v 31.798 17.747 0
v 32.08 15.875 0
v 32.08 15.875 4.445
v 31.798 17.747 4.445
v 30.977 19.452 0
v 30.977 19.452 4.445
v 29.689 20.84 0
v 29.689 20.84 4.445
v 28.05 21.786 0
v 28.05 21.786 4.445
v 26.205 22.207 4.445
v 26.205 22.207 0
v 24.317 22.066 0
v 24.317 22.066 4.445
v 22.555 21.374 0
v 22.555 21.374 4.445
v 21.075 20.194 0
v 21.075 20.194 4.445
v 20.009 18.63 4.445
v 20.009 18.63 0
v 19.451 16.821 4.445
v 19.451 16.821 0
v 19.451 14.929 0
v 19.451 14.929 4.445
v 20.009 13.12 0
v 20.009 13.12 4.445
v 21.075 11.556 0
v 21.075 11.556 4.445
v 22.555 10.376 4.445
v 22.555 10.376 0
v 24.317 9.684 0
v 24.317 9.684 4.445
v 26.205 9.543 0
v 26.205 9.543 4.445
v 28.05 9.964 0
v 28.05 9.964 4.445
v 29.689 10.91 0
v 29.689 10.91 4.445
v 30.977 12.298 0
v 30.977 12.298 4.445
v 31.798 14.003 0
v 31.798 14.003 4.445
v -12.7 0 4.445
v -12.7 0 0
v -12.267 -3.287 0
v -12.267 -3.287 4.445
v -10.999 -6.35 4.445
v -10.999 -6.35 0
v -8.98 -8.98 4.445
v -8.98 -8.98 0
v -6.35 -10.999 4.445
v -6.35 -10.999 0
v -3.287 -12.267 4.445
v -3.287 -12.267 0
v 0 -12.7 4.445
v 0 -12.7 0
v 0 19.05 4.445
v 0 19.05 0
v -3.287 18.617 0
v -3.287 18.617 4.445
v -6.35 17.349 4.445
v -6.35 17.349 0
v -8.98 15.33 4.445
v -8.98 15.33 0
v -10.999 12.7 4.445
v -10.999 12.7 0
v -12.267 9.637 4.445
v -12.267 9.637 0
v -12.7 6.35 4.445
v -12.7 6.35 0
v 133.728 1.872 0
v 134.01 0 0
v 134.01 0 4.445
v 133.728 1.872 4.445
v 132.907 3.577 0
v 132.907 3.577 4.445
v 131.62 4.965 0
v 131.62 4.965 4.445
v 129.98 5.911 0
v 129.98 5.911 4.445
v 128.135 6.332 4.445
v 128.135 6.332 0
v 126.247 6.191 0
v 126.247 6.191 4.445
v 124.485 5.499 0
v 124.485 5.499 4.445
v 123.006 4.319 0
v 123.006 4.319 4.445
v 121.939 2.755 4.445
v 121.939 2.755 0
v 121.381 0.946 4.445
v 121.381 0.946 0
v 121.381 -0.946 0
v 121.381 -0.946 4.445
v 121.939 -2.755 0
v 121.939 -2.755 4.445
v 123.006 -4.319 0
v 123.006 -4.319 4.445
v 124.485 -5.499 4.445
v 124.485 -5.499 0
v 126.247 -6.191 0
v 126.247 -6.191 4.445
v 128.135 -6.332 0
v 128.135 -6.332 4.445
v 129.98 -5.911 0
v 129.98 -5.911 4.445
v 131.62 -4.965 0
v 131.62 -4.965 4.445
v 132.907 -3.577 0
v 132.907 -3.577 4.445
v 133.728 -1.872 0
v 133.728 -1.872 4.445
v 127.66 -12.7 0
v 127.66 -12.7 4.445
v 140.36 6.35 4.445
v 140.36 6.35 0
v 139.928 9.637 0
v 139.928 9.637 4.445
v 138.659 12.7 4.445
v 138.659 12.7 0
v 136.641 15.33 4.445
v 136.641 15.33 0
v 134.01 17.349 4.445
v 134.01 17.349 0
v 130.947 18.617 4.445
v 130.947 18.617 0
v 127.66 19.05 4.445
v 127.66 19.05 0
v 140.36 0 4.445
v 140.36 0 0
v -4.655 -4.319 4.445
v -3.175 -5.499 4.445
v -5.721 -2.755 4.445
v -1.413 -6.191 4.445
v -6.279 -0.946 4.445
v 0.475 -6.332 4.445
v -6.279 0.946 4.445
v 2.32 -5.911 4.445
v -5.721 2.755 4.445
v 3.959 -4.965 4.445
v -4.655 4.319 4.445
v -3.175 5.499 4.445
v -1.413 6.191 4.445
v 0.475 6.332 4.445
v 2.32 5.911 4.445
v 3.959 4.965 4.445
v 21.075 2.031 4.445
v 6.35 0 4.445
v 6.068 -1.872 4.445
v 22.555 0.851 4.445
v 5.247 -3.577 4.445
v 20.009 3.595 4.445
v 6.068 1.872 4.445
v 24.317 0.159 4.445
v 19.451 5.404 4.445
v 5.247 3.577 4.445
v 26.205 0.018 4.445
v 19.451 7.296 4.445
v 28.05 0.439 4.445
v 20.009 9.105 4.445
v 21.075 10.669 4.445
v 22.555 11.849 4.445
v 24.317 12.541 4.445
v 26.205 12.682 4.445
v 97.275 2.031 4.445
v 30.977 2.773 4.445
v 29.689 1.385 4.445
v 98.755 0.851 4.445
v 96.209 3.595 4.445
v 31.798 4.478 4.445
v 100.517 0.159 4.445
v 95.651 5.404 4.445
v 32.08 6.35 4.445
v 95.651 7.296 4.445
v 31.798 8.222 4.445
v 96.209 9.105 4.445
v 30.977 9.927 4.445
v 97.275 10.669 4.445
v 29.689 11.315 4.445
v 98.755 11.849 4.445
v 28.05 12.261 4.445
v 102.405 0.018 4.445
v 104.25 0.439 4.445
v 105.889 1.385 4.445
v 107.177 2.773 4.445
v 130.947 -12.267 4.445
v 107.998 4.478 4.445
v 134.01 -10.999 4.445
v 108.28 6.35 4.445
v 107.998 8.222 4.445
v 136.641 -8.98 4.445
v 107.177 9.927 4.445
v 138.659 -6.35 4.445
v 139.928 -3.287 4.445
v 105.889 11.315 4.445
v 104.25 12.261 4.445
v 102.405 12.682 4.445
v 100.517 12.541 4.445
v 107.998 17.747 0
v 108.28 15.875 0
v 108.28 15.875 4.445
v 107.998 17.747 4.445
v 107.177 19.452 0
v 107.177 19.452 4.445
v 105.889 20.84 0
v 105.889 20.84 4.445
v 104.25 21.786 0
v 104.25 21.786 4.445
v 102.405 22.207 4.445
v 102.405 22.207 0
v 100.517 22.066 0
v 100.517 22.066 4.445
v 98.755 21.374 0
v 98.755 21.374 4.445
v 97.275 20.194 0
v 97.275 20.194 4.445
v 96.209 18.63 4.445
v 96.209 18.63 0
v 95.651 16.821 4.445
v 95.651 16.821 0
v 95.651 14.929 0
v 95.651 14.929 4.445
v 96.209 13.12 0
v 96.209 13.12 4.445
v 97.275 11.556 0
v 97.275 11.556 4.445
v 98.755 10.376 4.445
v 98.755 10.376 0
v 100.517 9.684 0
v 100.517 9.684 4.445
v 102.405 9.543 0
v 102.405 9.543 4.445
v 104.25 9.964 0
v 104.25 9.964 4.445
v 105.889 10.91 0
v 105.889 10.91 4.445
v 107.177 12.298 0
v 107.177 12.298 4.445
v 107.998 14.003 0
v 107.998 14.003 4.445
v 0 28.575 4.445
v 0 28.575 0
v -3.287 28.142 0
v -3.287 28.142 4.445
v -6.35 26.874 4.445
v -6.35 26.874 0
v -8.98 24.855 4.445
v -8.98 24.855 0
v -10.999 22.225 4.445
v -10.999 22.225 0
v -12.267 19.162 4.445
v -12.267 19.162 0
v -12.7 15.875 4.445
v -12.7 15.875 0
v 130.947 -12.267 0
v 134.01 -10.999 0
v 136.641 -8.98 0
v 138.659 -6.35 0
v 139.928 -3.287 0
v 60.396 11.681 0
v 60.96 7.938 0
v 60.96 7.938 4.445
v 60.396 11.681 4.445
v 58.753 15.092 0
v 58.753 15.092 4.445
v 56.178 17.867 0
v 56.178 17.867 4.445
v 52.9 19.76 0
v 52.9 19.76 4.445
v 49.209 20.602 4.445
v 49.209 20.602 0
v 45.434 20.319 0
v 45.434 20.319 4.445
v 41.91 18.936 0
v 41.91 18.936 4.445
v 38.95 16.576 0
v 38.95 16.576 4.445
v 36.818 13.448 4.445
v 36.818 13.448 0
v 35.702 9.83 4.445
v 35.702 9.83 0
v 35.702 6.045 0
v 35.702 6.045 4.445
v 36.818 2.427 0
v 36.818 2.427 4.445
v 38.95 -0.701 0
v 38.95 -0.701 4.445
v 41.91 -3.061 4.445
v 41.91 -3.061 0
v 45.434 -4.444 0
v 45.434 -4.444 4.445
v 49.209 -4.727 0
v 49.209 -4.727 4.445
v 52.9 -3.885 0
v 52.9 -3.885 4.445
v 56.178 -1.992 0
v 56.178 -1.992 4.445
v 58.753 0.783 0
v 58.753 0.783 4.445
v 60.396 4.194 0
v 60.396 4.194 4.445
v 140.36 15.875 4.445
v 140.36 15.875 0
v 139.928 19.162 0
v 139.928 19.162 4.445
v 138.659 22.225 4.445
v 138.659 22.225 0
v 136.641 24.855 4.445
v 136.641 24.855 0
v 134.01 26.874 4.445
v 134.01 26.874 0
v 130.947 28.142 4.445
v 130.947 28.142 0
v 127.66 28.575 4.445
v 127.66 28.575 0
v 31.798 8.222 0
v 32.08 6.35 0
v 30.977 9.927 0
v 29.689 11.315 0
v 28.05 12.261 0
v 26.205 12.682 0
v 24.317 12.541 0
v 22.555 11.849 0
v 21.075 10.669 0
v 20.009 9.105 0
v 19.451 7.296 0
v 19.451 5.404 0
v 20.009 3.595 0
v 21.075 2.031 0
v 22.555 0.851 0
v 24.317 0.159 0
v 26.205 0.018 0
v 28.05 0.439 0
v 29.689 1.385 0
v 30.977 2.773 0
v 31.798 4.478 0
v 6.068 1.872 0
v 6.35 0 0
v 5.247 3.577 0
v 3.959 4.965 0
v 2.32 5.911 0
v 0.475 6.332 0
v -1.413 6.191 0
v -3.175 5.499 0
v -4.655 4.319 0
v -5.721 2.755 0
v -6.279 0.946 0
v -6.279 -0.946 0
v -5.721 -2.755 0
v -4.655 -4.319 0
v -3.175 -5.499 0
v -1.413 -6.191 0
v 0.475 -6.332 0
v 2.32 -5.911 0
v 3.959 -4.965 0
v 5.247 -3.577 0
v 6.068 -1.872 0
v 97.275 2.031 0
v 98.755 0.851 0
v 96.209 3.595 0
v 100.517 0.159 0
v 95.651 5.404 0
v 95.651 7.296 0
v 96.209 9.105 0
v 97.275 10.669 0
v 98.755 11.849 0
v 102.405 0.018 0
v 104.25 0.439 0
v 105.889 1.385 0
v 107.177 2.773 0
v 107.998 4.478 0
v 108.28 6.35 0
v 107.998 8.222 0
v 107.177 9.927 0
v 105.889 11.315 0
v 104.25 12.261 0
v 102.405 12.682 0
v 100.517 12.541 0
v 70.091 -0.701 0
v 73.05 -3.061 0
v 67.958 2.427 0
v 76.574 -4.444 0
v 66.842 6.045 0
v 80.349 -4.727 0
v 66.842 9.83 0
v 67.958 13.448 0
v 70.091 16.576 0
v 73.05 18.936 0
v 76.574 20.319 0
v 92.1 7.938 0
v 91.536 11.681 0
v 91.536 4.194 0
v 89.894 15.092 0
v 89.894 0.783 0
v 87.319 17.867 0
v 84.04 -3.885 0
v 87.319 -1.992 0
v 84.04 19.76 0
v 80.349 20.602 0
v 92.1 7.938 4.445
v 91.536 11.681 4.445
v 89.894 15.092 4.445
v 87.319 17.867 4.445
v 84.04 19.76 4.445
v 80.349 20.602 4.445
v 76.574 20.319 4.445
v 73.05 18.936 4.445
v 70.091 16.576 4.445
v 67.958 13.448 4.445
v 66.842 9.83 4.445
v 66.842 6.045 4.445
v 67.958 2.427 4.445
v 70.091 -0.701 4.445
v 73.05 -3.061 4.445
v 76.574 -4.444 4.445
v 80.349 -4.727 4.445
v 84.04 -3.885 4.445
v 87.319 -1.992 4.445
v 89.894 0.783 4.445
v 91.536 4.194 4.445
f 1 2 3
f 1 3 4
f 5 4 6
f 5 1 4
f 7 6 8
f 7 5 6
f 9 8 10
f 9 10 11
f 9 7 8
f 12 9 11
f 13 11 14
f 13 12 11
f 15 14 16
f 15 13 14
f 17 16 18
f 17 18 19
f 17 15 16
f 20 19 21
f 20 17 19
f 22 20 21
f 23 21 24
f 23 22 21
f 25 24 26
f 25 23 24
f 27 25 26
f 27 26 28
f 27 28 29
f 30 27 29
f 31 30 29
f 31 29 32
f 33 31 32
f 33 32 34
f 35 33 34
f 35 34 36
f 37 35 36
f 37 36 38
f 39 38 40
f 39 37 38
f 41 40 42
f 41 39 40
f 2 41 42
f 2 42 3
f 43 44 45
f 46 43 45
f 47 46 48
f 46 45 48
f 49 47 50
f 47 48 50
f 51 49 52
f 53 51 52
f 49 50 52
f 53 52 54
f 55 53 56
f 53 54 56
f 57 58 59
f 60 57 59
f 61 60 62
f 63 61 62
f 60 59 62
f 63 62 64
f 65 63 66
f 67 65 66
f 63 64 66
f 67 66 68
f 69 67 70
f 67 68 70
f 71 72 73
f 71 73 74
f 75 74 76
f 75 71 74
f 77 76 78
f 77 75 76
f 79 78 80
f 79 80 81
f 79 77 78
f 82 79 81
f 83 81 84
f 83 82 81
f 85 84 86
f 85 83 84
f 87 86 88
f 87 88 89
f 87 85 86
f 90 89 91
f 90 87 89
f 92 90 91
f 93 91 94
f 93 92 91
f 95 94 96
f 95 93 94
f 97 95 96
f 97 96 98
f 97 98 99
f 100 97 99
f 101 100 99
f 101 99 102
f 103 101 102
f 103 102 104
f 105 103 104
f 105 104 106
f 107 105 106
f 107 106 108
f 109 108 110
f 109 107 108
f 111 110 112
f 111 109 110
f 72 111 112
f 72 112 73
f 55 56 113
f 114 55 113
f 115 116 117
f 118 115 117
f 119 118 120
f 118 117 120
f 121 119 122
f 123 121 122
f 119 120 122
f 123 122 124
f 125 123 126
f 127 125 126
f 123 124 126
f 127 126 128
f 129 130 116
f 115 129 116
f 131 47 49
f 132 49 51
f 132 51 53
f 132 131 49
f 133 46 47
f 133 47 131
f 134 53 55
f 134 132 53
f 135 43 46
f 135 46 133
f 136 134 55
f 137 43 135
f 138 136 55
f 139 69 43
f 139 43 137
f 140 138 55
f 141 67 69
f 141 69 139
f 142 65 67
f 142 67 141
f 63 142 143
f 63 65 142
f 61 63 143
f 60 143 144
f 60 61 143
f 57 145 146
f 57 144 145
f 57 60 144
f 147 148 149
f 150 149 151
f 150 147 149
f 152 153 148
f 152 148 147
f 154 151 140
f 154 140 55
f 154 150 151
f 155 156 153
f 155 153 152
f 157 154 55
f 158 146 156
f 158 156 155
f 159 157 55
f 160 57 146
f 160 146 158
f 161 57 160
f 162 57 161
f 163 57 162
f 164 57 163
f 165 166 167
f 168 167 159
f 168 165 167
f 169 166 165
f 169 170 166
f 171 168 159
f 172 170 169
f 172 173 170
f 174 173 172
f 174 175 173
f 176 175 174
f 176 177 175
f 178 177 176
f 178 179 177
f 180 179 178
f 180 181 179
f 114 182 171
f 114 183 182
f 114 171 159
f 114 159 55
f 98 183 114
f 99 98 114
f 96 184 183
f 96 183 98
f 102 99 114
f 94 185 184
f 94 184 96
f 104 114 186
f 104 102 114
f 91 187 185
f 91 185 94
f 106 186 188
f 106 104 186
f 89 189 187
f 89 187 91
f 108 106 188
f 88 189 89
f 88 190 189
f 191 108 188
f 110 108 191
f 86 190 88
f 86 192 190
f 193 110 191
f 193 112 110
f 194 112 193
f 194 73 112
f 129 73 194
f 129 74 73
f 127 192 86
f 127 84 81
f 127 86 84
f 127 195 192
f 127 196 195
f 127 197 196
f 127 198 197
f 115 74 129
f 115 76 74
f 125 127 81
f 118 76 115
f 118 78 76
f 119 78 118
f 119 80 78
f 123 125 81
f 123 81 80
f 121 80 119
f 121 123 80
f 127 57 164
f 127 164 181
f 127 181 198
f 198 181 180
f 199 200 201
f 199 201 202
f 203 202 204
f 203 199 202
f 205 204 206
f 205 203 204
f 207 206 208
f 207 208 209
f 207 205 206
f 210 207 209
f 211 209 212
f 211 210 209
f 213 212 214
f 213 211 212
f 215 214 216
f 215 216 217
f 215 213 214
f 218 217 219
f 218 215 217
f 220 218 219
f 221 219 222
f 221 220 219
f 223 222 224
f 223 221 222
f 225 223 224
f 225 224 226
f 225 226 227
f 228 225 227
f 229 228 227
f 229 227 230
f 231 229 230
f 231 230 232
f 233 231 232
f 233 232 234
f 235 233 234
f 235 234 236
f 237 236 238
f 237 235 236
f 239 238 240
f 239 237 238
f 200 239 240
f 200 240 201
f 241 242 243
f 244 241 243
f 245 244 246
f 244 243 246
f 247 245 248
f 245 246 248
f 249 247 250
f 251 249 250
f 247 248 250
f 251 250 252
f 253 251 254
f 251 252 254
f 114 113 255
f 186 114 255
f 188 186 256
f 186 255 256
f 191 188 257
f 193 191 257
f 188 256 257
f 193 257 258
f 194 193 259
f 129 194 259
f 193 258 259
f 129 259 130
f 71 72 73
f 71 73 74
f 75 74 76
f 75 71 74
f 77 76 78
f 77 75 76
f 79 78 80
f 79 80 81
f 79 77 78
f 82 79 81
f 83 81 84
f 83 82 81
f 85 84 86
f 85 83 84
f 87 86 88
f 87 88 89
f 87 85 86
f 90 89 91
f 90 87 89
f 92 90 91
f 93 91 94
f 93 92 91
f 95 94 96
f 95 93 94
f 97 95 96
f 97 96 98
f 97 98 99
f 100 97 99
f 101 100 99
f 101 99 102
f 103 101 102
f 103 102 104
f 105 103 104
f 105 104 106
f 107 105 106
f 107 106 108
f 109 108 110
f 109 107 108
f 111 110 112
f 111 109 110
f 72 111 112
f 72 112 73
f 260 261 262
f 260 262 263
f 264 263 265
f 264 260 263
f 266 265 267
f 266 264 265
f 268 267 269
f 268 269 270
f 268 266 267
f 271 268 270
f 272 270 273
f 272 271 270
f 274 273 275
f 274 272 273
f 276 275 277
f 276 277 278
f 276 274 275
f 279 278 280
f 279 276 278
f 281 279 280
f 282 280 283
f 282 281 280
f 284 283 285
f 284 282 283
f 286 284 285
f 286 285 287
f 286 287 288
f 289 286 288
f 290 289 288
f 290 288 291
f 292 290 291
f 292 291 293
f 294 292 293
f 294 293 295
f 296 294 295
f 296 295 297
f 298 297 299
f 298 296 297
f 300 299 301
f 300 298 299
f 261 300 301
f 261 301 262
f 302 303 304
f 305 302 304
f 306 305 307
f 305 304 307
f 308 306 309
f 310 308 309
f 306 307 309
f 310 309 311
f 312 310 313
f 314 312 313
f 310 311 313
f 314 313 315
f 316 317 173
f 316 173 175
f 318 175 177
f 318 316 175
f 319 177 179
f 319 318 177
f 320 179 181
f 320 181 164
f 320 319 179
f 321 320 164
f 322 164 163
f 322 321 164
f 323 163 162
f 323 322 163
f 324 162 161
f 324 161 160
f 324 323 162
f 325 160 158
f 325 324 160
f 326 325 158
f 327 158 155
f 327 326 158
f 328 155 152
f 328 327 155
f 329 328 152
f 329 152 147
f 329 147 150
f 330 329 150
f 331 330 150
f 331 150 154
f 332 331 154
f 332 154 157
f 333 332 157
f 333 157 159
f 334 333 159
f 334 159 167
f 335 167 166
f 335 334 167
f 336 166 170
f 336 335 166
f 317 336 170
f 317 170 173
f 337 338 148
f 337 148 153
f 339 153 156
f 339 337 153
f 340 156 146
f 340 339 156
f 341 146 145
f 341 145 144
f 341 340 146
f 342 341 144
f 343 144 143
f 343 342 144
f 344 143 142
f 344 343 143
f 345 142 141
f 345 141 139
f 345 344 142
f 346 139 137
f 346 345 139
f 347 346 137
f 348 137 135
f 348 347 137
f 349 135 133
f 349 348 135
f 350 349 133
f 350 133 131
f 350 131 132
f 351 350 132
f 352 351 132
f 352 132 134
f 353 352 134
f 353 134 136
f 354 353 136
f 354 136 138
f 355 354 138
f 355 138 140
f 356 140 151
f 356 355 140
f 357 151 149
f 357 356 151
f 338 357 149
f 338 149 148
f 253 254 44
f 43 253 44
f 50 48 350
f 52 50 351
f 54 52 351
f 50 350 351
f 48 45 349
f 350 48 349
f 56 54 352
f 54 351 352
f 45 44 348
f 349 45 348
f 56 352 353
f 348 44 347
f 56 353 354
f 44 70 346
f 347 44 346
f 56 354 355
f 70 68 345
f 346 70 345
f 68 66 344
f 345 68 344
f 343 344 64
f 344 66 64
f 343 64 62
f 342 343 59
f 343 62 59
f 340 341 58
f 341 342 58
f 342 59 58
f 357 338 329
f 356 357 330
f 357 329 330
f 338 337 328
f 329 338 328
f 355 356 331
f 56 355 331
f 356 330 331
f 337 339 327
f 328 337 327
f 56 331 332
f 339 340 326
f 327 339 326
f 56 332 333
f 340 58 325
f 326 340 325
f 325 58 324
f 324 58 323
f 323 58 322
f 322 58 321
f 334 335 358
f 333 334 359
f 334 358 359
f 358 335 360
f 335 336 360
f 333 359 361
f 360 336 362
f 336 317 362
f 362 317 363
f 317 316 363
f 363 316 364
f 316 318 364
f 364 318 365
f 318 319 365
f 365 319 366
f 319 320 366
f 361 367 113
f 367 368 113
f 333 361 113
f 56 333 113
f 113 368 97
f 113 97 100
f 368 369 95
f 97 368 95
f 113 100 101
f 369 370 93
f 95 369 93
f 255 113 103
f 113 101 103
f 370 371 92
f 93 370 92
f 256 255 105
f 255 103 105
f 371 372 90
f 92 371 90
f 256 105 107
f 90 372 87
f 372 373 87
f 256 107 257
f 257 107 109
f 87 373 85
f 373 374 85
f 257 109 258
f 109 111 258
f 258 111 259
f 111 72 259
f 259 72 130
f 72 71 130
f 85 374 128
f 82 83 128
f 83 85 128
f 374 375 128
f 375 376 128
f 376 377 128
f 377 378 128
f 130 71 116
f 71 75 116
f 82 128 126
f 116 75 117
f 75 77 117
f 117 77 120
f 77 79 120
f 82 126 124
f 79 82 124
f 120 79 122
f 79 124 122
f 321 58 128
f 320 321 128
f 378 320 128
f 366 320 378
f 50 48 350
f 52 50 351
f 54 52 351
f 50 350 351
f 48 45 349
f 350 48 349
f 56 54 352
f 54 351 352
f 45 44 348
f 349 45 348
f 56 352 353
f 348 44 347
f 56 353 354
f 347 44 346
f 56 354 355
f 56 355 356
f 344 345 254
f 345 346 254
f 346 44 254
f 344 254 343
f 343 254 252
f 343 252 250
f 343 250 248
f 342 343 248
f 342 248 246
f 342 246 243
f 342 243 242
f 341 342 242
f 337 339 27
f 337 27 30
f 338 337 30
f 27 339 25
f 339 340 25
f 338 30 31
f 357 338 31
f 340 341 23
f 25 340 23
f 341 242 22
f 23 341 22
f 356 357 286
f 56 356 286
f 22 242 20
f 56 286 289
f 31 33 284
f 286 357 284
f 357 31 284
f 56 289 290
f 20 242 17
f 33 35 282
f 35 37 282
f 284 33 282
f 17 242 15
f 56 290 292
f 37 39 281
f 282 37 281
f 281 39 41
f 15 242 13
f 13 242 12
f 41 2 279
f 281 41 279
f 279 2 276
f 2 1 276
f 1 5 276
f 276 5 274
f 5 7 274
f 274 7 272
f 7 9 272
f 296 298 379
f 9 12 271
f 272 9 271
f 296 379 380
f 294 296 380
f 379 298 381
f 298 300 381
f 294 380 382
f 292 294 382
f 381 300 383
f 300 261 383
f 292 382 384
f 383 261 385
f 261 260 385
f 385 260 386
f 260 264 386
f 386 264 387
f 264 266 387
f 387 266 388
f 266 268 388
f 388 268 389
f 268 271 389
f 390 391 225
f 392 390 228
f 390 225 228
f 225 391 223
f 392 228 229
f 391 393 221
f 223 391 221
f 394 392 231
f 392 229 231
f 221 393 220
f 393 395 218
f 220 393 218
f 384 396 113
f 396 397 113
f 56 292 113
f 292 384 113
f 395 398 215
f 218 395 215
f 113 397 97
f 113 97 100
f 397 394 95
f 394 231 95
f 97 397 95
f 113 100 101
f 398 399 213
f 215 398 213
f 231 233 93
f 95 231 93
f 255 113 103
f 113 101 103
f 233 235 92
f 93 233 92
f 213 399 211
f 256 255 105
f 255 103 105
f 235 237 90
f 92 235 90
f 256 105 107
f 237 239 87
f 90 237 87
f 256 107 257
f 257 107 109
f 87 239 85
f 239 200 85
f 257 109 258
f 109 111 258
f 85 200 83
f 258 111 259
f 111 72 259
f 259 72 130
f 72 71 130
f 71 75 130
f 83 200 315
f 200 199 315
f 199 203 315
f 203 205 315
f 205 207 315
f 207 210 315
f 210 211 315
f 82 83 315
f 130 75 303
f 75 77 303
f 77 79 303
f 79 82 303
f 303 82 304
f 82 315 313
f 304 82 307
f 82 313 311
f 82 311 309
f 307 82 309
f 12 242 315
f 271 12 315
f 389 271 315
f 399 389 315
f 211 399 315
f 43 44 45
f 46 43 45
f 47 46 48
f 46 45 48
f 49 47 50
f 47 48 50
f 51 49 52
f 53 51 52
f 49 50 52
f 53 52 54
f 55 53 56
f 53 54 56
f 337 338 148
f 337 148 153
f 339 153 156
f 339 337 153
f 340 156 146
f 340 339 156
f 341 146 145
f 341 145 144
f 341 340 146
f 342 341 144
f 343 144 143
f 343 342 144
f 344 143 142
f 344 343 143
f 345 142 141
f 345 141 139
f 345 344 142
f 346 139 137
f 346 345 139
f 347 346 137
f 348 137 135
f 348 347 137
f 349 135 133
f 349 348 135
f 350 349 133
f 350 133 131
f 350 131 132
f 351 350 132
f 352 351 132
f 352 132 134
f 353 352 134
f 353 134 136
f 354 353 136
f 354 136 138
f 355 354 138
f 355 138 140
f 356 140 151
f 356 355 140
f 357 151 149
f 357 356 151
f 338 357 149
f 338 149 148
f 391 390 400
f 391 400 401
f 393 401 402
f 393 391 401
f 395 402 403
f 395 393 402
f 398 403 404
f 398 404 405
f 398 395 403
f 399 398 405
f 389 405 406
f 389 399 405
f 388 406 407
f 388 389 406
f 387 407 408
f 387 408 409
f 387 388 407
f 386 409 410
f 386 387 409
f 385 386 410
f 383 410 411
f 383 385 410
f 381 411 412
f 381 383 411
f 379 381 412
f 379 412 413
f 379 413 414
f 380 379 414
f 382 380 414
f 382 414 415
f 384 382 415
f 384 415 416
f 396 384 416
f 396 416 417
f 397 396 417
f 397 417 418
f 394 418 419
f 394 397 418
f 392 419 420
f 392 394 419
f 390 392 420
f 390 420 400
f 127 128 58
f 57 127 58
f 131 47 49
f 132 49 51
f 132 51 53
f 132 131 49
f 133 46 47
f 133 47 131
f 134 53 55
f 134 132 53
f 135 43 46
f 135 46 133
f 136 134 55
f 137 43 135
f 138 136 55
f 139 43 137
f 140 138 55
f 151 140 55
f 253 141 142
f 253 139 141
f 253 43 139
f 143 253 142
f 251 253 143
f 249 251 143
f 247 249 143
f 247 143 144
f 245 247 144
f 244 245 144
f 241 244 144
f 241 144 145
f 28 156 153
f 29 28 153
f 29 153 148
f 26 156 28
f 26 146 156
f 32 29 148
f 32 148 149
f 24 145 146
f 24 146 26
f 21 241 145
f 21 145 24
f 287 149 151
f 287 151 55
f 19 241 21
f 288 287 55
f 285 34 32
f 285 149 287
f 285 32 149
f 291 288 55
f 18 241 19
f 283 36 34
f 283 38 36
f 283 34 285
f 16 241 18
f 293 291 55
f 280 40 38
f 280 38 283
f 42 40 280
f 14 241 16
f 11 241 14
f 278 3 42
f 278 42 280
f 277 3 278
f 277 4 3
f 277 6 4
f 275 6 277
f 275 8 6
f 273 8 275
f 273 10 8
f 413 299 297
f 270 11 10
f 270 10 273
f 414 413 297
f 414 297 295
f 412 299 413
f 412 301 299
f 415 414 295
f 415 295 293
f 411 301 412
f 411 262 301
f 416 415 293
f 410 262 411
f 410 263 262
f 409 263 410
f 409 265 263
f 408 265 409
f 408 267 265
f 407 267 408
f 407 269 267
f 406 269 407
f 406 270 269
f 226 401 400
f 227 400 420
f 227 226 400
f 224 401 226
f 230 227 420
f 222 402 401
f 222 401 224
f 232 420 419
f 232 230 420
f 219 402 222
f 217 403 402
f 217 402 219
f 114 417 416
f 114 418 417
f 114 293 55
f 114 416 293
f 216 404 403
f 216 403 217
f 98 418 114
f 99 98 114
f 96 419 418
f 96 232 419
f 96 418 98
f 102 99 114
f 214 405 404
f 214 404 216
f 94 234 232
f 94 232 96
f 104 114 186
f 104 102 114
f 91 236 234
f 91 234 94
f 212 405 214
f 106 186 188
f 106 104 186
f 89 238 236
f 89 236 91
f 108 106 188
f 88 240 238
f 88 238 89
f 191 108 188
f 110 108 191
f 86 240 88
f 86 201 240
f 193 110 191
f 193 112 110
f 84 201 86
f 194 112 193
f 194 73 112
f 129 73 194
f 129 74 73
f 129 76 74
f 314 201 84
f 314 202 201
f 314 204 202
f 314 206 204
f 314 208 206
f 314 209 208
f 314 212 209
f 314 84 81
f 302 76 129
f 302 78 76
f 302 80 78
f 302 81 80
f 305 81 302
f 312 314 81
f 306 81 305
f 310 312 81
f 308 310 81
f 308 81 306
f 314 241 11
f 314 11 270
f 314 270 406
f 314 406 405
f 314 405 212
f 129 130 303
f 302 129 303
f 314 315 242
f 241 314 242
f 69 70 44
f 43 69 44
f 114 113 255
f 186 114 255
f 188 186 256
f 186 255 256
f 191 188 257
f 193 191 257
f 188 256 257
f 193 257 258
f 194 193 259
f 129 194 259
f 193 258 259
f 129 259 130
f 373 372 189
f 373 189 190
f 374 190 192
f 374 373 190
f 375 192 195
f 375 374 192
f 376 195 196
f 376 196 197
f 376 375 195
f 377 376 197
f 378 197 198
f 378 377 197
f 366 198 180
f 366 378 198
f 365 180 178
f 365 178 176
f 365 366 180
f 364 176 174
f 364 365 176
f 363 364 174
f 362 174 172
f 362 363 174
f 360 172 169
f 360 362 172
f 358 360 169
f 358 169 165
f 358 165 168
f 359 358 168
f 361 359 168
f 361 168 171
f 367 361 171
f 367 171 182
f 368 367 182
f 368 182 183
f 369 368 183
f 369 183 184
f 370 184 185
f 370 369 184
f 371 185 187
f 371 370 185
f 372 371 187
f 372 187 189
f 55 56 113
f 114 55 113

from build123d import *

# Parameters (mm, degrees)
F0_R     = 6.35
F1_DEPTH = 4.445
F2_R     = 6.35
F2_R_2   = 12.7
F3_DEPTH = 4.445


with BuildPart() as f1:
    # F0 (on Top) → F1 (new body)
    with BuildSketch(Plane.XY):
        with BuildLine():
            Line((127.6604, 19.05), (0, 19.05))
            ThreePointArc((0, 19.05), (-8.980256, 15.330256), (-12.7, 6.35))
            Line((-12.7, 6.35), (-12.7, 0))
            ThreePointArc((-12.7, 0), (-8.980256, -8.980256), (0, -12.7))
            Line((0, -12.7), (127.6604, -12.7))
            ThreePointArc((127.6604, -12.7), (136.640656, -8.980256), (140.3604, 0))
            Line((140.3604, 0), (140.3604, 6.35))
            ThreePointArc((140.3604, 6.35), (136.640656, 15.330256), (127.6604, 19.05))
        make_face()
        Circle(F0_R, mode=Mode.SUBTRACT)
        with Locations((127.6604, 0)):
            Circle(F0_R, mode=Mode.SUBTRACT)
        with Locations((25.7302, 6.35)):
            Circle(F0_R, mode=Mode.SUBTRACT)
        with Locations((101.9302, 6.35)):
            Circle(F0_R, mode=Mode.SUBTRACT)
    extrude(amount=F1_DEPTH)


with BuildPart() as f3:
    # F2 (on Top) → F3 (new body)
    with BuildSketch(Plane.XY):
        with BuildLine():
            Line((127.6604, 28.575), (0, 28.575))
            ThreePointArc((0, 28.575), (-8.980256, 24.855256), (-12.7, 15.875))
            Line((-12.7, 15.875), (-12.7, 0))
            ThreePointArc((-12.7, 0), (-8.980256, -8.980256), (0, -12.7))
            Line((0, -12.7), (127.6604, -12.7))
            ThreePointArc((127.6604, -12.7), (136.640656, -8.980256), (140.3604, 0))
            Line((140.3604, 0), (140.3604, 15.875))
            ThreePointArc((140.3604, 15.875), (136.640656, 24.855256), (127.6604, 28.575))
        make_face()
        Circle(F2_R, mode=Mode.SUBTRACT)
        with Locations((127.6604, 0)):
            Circle(F2_R, mode=Mode.SUBTRACT)
        with Locations((48.26, 7.9375)):
            Circle(F2_R_2, mode=Mode.SUBTRACT)
        with Locations((25.7302, 15.875)):
            Circle(F2_R, mode=Mode.SUBTRACT)
        with Locations((79.4004, 7.9375)):
            Circle(F2_R_2, mode=Mode.SUBTRACT)
        with Locations((101.9302, 15.875)):
            Circle(F2_R, mode=Mode.SUBTRACT)
    extrude(amount=F3_DEPTH)


solid = Compound([f1.part, f3.part])
